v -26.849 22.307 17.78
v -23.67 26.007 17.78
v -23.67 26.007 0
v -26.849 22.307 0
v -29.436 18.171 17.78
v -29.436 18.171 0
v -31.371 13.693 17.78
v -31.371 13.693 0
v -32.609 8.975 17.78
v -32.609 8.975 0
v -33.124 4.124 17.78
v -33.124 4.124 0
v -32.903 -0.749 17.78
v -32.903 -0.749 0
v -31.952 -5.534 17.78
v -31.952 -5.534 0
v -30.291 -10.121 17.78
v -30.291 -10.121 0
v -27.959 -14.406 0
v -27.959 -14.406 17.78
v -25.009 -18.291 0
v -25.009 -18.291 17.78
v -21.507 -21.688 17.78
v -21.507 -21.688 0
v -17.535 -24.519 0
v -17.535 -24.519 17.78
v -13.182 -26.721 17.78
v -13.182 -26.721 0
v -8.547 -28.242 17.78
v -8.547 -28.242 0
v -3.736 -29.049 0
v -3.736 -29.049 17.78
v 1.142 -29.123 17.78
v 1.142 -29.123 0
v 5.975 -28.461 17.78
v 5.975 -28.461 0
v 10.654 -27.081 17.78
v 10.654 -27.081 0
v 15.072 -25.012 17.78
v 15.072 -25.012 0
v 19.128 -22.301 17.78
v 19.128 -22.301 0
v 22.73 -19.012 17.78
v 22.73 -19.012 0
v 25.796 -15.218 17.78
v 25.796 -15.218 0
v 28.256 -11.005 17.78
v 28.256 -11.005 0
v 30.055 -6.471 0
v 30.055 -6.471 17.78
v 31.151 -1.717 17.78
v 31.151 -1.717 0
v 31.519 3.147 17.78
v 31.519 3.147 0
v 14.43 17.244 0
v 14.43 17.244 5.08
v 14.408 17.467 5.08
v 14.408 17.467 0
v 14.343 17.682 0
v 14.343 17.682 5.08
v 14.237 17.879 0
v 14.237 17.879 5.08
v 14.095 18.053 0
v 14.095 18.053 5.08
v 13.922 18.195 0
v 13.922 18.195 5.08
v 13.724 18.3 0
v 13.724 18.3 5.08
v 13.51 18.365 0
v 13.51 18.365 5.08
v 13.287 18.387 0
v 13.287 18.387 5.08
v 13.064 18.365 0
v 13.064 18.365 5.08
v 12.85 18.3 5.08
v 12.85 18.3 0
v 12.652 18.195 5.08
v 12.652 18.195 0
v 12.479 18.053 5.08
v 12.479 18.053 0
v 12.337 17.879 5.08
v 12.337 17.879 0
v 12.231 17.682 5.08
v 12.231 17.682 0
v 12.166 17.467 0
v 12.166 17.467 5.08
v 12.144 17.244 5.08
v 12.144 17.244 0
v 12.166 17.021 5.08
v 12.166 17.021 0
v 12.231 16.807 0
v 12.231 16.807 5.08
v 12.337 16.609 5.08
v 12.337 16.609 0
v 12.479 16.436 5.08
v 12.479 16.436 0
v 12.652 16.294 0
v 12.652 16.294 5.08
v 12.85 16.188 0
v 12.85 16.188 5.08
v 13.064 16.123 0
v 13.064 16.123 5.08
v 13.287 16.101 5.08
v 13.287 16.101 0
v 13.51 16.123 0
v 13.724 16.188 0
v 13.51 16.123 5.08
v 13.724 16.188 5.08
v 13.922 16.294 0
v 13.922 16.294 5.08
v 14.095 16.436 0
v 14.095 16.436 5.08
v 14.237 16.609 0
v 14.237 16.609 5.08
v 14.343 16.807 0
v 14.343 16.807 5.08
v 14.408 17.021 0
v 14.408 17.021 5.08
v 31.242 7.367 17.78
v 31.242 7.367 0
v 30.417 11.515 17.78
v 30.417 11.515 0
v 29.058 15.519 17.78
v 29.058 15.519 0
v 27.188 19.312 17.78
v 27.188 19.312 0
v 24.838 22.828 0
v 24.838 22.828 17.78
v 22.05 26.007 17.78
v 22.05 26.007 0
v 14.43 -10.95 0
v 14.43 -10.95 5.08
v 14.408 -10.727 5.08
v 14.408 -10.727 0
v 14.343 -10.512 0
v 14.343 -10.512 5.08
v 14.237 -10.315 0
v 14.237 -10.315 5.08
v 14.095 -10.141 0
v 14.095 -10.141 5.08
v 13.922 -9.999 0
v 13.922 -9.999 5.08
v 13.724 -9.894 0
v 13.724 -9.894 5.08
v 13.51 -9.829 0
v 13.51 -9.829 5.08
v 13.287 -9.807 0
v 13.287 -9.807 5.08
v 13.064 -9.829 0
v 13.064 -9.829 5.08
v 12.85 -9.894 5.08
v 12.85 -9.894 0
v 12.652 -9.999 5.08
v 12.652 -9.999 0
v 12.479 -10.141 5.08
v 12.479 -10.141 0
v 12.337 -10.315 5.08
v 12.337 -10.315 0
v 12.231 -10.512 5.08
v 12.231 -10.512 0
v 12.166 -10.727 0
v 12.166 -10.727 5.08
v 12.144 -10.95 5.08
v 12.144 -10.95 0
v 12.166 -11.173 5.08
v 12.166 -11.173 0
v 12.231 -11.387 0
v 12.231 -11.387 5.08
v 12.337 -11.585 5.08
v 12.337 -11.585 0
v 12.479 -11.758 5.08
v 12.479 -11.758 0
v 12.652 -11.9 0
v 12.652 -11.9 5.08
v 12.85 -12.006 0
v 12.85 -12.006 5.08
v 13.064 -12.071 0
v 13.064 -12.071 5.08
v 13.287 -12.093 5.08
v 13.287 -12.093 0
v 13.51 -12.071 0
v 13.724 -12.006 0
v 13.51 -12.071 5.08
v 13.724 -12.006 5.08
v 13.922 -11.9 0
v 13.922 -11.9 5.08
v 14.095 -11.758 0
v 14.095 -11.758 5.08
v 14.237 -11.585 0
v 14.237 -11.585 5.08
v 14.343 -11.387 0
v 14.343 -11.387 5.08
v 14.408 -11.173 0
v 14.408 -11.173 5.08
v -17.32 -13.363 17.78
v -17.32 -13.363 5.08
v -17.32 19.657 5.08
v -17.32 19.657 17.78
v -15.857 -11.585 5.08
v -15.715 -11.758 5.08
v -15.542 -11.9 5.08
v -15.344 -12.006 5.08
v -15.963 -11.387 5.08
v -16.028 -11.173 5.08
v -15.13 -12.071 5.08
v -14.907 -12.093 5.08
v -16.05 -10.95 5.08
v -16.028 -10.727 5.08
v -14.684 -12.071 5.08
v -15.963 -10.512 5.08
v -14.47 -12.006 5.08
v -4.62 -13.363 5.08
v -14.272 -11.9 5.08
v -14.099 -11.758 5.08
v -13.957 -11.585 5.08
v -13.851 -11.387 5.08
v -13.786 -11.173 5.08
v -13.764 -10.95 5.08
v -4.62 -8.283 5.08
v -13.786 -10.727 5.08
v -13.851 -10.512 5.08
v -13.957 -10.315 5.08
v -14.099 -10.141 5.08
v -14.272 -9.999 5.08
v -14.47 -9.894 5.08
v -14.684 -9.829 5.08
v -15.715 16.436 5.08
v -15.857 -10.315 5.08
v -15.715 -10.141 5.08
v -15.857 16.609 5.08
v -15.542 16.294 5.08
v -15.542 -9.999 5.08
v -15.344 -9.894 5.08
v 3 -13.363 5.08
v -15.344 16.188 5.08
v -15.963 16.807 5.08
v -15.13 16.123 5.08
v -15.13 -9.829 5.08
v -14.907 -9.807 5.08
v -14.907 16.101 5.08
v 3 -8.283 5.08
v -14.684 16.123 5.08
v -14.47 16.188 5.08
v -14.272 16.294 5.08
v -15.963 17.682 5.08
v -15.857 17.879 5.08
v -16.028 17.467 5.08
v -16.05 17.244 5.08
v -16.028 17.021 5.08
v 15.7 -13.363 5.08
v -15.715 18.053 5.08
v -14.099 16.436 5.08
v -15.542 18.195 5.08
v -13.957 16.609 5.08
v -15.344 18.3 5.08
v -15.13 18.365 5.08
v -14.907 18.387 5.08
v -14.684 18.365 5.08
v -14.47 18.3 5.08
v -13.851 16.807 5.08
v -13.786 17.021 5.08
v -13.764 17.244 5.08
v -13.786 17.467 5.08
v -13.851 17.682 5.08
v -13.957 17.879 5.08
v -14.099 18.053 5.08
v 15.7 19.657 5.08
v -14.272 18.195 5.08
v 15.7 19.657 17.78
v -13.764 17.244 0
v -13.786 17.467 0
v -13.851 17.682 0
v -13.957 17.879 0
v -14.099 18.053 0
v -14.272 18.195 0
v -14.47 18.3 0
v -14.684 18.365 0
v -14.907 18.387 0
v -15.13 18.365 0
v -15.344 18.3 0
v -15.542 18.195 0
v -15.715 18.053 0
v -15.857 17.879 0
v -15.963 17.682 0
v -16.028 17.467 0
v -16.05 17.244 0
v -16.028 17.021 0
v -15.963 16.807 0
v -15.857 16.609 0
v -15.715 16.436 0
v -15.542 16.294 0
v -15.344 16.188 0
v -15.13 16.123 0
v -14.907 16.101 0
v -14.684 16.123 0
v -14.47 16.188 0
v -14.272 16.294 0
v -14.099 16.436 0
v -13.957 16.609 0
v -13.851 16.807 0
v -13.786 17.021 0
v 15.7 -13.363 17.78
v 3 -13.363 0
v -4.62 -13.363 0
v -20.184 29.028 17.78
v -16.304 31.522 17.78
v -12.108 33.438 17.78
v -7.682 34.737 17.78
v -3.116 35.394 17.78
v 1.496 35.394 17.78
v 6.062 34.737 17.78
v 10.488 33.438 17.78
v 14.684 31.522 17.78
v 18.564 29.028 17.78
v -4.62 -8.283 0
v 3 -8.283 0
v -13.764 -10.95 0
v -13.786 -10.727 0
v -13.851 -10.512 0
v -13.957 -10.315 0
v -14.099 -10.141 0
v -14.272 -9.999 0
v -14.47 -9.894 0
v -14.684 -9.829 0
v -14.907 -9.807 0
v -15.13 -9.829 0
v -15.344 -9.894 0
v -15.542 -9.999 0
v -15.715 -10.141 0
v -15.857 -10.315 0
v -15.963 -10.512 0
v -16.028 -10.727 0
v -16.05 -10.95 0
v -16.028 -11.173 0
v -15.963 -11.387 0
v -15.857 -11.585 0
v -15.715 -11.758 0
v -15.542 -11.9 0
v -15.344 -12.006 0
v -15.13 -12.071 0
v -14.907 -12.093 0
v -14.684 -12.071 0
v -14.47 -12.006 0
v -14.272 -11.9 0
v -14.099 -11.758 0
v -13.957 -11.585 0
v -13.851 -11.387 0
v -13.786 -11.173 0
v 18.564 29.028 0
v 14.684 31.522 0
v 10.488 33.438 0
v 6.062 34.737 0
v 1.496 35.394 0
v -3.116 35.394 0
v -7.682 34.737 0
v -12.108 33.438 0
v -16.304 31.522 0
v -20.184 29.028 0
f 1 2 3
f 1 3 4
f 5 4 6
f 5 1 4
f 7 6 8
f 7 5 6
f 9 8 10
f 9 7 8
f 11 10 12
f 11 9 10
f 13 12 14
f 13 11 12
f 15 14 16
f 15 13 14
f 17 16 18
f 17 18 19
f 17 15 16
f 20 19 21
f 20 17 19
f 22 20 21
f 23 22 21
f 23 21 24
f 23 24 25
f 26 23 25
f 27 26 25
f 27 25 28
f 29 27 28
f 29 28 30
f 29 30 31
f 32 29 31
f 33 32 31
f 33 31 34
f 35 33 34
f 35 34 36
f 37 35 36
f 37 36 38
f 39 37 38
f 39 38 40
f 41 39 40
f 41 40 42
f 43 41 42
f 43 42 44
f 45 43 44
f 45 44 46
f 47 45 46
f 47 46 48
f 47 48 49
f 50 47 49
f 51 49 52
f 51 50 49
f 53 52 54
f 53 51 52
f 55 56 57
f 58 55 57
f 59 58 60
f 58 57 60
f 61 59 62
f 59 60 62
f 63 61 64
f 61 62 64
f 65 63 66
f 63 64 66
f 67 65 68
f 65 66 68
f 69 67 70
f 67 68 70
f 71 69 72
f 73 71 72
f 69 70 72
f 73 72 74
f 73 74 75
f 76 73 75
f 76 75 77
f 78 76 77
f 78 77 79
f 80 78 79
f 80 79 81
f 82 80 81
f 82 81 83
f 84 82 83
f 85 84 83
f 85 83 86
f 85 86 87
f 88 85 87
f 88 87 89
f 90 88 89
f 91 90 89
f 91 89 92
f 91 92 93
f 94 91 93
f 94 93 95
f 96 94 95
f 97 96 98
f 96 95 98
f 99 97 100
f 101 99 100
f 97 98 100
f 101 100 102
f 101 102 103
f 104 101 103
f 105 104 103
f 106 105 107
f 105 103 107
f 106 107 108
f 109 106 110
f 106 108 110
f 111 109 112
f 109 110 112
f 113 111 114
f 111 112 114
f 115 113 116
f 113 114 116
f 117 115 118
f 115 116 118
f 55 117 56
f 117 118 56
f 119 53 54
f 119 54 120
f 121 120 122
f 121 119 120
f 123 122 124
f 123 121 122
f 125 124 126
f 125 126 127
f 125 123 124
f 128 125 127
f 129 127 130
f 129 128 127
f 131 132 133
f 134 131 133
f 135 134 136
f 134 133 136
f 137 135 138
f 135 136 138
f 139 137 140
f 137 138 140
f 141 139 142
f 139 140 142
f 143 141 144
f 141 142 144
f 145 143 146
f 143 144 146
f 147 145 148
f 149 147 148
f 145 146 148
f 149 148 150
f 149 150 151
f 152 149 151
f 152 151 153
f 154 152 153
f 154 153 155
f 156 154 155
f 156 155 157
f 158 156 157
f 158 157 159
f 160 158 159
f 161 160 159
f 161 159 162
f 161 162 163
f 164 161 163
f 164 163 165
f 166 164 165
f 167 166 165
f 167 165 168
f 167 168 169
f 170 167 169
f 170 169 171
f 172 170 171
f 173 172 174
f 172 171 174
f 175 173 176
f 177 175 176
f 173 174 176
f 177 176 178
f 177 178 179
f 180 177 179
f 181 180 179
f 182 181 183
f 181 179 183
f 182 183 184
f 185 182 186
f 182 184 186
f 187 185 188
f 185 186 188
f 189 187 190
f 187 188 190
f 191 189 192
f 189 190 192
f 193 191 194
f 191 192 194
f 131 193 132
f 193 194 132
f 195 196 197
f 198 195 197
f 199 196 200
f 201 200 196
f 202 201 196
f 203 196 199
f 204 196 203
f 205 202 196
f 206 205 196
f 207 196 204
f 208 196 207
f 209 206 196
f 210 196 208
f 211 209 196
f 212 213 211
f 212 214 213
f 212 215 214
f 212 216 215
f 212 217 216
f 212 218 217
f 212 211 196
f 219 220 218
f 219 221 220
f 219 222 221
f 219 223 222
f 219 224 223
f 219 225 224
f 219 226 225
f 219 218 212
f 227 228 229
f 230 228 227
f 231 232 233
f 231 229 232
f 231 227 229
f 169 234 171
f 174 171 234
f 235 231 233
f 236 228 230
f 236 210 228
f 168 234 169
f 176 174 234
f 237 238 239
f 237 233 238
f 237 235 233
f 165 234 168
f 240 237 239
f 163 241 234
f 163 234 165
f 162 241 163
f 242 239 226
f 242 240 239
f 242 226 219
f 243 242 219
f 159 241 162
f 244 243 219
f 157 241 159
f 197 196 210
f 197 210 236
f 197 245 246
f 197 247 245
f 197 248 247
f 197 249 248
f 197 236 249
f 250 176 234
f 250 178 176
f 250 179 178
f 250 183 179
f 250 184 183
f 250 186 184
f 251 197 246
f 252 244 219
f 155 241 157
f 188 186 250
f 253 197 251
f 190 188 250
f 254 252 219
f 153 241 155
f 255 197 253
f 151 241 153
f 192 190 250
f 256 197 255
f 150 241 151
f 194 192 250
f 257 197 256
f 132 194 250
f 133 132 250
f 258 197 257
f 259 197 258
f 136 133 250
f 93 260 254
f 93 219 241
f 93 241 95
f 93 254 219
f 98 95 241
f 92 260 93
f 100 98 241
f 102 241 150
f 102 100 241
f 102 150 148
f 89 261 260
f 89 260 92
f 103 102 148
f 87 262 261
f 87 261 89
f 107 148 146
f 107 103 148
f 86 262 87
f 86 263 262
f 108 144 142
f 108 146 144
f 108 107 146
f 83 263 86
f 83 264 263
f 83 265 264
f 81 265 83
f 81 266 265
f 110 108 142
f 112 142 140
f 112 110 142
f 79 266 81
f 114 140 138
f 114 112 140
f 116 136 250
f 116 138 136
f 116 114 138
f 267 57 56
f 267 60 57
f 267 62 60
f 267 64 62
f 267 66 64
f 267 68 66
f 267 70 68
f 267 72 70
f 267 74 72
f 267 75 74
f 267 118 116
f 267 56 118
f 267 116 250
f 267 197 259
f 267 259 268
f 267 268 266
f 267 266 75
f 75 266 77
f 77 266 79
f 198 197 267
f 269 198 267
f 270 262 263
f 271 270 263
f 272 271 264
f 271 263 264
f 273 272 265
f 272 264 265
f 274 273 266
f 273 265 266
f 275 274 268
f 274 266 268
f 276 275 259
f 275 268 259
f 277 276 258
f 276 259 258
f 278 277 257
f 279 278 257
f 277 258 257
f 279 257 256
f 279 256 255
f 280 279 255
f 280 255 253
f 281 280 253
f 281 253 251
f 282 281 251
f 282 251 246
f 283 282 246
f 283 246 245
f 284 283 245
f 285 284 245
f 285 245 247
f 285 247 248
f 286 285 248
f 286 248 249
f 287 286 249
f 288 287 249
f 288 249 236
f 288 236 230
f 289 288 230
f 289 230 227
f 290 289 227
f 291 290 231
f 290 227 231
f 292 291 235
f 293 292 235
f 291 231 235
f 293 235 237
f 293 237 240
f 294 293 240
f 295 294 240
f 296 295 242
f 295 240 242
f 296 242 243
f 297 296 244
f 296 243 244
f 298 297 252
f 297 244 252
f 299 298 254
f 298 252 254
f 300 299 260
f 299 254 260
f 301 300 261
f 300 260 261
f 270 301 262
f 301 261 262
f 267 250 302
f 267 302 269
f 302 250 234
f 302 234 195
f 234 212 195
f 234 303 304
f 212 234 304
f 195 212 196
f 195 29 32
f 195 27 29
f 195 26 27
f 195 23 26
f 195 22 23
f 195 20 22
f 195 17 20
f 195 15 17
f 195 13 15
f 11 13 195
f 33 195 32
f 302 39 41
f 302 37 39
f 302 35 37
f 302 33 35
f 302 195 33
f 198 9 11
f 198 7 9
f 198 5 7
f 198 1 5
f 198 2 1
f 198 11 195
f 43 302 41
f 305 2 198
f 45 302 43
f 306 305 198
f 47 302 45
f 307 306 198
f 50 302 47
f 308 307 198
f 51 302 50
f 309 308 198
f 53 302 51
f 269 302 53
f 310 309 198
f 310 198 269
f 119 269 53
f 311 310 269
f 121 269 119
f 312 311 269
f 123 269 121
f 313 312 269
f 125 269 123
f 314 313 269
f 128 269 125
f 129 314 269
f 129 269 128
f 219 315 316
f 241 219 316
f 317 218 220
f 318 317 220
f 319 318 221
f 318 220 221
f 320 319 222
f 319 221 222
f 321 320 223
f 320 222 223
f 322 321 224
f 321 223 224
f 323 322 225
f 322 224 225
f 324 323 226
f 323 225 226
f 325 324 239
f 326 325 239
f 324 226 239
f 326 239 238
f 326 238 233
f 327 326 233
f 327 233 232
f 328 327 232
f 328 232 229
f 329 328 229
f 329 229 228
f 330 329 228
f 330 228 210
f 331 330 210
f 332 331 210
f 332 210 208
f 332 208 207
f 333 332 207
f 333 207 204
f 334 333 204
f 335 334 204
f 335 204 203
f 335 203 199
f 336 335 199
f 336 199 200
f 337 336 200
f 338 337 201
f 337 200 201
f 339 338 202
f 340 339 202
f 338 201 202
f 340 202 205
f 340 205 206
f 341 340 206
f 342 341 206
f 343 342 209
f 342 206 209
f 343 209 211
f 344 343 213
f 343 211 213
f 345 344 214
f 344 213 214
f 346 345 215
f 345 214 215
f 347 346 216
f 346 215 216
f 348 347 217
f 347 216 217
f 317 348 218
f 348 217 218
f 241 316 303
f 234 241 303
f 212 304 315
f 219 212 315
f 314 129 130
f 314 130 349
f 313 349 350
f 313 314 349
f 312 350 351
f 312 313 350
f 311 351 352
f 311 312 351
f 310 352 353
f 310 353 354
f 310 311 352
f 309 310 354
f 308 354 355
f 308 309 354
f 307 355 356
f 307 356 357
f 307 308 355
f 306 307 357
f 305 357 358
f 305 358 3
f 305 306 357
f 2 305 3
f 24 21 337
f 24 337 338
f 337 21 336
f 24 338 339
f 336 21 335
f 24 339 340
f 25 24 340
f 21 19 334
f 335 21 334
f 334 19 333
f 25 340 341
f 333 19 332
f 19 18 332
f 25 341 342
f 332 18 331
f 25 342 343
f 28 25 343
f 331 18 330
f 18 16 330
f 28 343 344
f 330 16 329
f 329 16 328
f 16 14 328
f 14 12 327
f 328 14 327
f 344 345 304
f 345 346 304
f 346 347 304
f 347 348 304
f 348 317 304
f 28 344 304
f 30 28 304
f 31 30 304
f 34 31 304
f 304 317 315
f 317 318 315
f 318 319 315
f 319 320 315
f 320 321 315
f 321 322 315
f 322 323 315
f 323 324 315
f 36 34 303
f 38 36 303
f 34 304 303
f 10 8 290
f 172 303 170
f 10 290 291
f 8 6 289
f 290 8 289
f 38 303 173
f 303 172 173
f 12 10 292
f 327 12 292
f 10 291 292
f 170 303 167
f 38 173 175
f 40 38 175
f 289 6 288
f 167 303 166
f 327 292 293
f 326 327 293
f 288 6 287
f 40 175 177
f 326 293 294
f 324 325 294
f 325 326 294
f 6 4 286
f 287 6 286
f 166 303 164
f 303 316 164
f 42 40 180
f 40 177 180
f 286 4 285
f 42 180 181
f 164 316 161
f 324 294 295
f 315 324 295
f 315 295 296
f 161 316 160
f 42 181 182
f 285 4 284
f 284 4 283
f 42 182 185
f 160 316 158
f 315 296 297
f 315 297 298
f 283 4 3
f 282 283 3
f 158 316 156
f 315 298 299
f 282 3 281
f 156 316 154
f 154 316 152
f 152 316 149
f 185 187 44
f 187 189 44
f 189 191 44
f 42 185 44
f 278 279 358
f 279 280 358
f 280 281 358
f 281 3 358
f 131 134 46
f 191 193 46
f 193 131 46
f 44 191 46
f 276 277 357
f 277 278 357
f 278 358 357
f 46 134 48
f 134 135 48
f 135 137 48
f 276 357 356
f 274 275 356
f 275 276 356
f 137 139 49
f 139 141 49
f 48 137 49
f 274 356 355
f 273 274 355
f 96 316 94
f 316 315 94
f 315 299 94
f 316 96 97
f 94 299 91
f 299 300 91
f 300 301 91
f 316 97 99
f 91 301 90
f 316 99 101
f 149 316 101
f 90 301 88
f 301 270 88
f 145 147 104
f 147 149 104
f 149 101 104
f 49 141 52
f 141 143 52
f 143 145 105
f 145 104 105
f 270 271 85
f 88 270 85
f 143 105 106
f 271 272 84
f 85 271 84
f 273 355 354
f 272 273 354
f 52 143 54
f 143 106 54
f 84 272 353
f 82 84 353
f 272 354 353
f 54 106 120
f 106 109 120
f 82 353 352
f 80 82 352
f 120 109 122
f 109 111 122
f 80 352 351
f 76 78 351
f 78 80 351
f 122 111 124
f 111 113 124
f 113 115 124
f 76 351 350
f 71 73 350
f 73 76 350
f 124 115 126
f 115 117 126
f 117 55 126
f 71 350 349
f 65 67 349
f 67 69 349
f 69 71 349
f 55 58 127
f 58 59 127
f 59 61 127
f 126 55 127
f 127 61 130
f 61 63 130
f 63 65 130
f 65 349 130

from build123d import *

# Parameters (mm, degrees)
F1_DEPTH = 5.08
F2_W     = 6.35
F2_H     = 33.02
F3_DEPTH = 5.08
F4_DEPTH = 12.7
F5_R     = 1.143
F6_DEPTH = 25.4
F7_W     = 45.72
F7_H     = 45.72
F7_W_2   = 33.02
F7_H_2   = 33.02
F8_DEPTH = 17.78


with BuildPart() as f1:
    # F0 (on Top) → F1 (new body)
    with BuildSketch(Plane.XY):
        Polygon((15.6999393499, 19.6573674963), (-17.3200606501, 19.6573674963), (-17.3200606501, -13.3626325037), (-4.6200606501, -13.3626325037), (-4.6200606501, -8.2826325037), (2.9999393499, -8.2826325037), (2.9999393499, -13.3626325037), (15.6999393499, -13.3626325037), align=None)
    extrude(amount=F1_DEPTH)

    # F2 (on face) → F3 (join)
    with BuildSketch(Plane.XY.offset(5.08)):
        with Locations((18.8749393499, 3.1473674963)):
            Rectangle(F2_W, F2_H)
        Polygon((-17.3200606501, 26.0073674963), (-17.3200606501, 19.6573674963), (15.6999393499, 19.6573674963), (22.0499393499, 19.6573674963), (22.0499393499, 26.0073674963), align=None)
        Polygon((-4.6200606501, -13.3626325037), (-17.3200606501, -13.3626325037), (-17.3200606501, -19.7126325037), (22.0499393499, -19.7126325037), (22.0499393499, -13.3626325037), (15.6999393499, -13.3626325037), (2.9999393499, -13.3626325037), align=None)
        Polygon((-17.3200606501, -13.3626325037), (-17.3200606501, 19.6573674963), (-17.3200606501, 26.0073674963), (-23.6700606501, 26.0073674963), (-23.6700606501, -19.7126325037), (-17.3200606501, -19.7126325037), align=None)
    extrude(amount=-F3_DEPTH)

    # F2 (on face) → F4 (join)
    with BuildSketch(Plane.XY.offset(5.08)):
        Polygon((-17.3200606501, 26.0073674963), (-17.3200606501, 19.6573674963), (15.6999393499, 19.6573674963), (22.0499393499, 19.6573674963), (22.0499393499, 26.0073674963), align=None)
        with Locations((18.8749393499, 3.1473674963)):
            Rectangle(F2_W, F2_H)
        Polygon((-4.6200606501, -13.3626325037), (-17.3200606501, -13.3626325037), (-17.3200606501, -19.7126325037), (22.0499393499, -19.7126325037), (22.0499393499, -13.3626325037), (15.6999393499, -13.3626325037), (2.9999393499, -13.3626325037), align=None)
        Polygon((-17.3200606501, -13.3626325037), (-17.3200606501, 19.6573674963), (-17.3200606501, 26.0073674963), (-23.6700606501, 26.0073674963), (-23.6700606501, -19.7126325037), (-17.3200606501, -19.7126325037), align=None)
    extrude(amount=F4_DEPTH)

    # F5 (on face) → F6 (cut)
    with BuildSketch(Plane.XY.offset(5.08)):
        with Locations((13.2869393499, 17.2443674963)):
            Circle(F5_R)
        with Locations((-14.9070606501, -10.9496325037)):
            Circle(F5_R)
        with Locations((13.2869393499, -10.9496325037)):
            Circle(F5_R)
        with Locations((-14.9070606501, 17.2443674963)):
            Circle(F5_R)
    extrude(amount=-F6_DEPTH, mode=Mode.SUBTRACT)

    # F7 (on face) → F8 (join)
    with BuildSketch(Plane.XY.offset(17.78)):
        with BuildLine():
            ThreePointArc((22.0499393499, -19.7126325037), (29.057968727, -9.224375353), (31.5188613857, 3.1473674963))
            ThreePointArc((31.5188613857, 3.1473674963), (29.057968727, 15.5191103457), (22.0499393499, 26.0073674963))
            Line((22.0499393499, 26.0073674963), (22.0499393499, -19.7126325037))
        make_face()
        with BuildLine():
            Line((-23.6700606501, 26.0073674963), (22.0499393499, 26.0073674963))
            ThreePointArc((22.0499393499, 26.0073674963), (-0.8100606501, 35.4762895322), (-23.6700606501, 26.0073674963))
        make_face()
        with Locations((-0.8100606501, 3.1473674963)):
            Rectangle(F7_W, F7_H)
        with Locations((-0.8100606501, 3.1473674963)):
            Rectangle(F7_W_2, F7_H_2, mode=Mode.SUBTRACT)
        with BuildLine():
            ThreePointArc((-23.6700606501, -19.7126325037), (-0.8100606501, -29.1815545395), (22.0499393499, -19.7126325037))
            Line((22.0499393499, -19.7126325037), (-23.6700606501, -19.7126325037))
        make_face()
        with BuildLine():
            Line((-23.6700606501, -19.7126325037), (-23.6700606501, 26.0073674963))
            ThreePointArc((-23.6700606501, 26.0073674963), (-33.138982686, 3.1473674963), (-23.6700606501, -19.7126325037))
        make_face()
    extrude(amount=-F8_DEPTH)


solid = f1.part
